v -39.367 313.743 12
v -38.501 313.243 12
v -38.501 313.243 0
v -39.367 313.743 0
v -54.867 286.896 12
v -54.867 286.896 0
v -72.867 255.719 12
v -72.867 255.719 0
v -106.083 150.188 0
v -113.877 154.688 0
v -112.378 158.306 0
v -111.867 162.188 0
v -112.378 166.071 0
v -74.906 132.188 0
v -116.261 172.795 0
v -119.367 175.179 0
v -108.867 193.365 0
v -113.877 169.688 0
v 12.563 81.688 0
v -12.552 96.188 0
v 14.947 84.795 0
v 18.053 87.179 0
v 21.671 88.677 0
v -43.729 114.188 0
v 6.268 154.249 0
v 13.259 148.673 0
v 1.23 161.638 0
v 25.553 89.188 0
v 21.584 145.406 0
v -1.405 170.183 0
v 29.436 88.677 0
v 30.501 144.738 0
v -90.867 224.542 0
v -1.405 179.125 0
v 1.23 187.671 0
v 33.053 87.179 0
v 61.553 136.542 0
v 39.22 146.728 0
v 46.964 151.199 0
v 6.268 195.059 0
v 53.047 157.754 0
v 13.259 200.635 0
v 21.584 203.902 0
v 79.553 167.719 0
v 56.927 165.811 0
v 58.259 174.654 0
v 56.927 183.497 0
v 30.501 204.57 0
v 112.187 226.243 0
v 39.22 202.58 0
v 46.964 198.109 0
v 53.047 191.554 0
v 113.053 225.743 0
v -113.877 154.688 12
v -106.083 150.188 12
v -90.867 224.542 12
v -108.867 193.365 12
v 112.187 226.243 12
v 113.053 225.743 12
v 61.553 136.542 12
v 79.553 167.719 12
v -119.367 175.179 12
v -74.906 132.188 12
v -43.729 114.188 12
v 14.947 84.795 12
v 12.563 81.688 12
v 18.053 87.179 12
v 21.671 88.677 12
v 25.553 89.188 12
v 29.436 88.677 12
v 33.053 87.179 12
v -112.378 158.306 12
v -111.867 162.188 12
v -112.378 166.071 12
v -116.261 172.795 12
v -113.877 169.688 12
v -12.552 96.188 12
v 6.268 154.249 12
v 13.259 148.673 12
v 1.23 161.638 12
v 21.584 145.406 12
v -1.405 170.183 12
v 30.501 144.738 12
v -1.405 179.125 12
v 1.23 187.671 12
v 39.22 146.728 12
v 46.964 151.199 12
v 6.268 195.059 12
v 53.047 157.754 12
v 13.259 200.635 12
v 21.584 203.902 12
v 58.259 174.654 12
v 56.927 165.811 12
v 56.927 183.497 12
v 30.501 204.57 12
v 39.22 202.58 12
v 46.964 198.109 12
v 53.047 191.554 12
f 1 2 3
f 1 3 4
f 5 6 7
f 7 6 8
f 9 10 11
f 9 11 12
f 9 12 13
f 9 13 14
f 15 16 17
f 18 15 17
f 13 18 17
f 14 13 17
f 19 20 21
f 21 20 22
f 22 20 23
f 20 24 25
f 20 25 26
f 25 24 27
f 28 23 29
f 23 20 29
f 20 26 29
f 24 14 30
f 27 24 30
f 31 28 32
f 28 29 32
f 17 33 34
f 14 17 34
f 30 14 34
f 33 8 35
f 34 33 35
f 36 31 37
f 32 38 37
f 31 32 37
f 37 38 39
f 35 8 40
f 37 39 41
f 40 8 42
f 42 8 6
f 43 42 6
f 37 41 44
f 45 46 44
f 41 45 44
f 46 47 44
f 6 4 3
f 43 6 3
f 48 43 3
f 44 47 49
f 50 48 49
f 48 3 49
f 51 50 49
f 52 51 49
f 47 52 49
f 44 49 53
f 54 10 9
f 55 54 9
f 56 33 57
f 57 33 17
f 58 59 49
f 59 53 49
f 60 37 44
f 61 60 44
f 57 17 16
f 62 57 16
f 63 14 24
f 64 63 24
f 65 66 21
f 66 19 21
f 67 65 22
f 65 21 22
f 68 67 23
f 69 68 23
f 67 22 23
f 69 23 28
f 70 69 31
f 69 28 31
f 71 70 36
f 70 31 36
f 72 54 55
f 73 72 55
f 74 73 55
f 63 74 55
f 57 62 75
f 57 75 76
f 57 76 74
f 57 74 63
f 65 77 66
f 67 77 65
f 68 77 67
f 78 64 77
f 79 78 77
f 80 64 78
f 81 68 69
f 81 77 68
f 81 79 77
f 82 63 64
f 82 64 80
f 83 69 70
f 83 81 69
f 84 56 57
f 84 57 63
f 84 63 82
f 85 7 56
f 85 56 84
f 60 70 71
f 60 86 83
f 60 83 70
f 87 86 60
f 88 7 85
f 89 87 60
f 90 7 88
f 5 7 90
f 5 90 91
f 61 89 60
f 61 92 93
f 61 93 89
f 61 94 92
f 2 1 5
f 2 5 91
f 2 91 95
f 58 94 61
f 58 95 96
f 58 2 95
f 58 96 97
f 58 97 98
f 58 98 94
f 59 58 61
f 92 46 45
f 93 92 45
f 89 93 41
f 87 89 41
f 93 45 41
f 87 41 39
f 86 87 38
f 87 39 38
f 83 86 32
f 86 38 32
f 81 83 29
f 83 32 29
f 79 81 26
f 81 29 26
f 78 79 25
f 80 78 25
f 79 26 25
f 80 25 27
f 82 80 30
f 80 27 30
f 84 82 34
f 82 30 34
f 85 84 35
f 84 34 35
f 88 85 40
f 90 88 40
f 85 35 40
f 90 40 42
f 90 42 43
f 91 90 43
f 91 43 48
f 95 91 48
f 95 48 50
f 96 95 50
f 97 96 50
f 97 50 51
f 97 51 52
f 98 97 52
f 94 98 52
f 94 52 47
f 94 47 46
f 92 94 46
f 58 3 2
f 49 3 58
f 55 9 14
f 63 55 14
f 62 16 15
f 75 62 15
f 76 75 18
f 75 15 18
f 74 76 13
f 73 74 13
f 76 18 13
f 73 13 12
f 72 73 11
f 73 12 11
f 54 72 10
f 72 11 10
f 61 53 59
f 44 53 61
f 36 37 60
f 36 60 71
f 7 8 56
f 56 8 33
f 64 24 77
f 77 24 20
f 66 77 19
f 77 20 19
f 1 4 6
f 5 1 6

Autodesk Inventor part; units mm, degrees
ref_plane "YZ Plane" through (0, 0, 0) normal (1, 0, 0) x (0, 1, 0)
ref_plane "XZ Plane" through (0, 0, 0) normal (0, 1, 0) x (-1, 0, 0)
ref_plane "XY Plane" through (0, 0, 0) normal (0, 0, 1) x (1, 0, 0)
ref_plane "Work Plane1" through (0, 0, 0) normal (0, 0, 1) x (1, 0, 0)
sketch "Sketch1" plane through (0, 0, 0) normal (0, 0, 1) x (1, 0, 0)
  circle A0 centre (68.259454, 214.654052) radius 4
  line L0 (64.259454, -185.345948) -> (64.259454, -225.345948)
  arc A1 (72.259454, -185.345948) -> (64.259454, -185.345948) centre (68.259454, -185.345948) ccw
  line L1 (72.259454, -225.345948) -> (72.259454, -185.345948)
  arc A2 (64.259454, -225.345948) -> (72.259454, -225.345948) centre (68.259454, -225.345948) ccw
  line L2 (-101.259454, 230.542101) -> (-90.867149, 224.542101)
  line L3 (-90.867149, 224.542101) -> (-108.867149, 193.365186)
  line L4 (-108.867149, 193.365186) -> (-119.259454, 199.365186)
  line L5 (-137.259454, 168.188271) -> (-119.259454, 199.365186)
  line L6 (-137.259454, 168.188271) -> (-106.082539, 150.188271)
  line L7 (-106.082539, 150.188271) -> (-112.082539, 139.795967)
  line L8 (-80.905625, 121.795967) -> (-112.082539, 139.795967)
  line L9 (-80.905625, 121.795967) -> (-74.905625, 132.188271)
  line L10 (-74.905625, 132.188271) -> (-43.72871, 114.188271)
  line L11 (-43.72871, 114.188271) -> (-49.72871, 103.795967)
  line L12 (-18.551796, 85.795967) -> (-49.72871, 103.795967)
  line L13 (-18.551796, 85.795967) -> (-12.551796, 96.188271)
  line L14 (-12.551796, 96.188271) -> (18.625119, 78.188271)
  line L15 (18.625119, 78.188271) -> (12.625119, 67.795967)
  line L16 (23.259454, 61.656231) -> (12.625119, 67.795967)
  line L17 (23.259454, -7.001047) -> (23.259454, 61.656231)
  line L18 (23.259454, -7.001047) -> (35.259454, -7.001047)
  line L19 (35.259454, -7.001047) -> (35.259454, -43.001047)
  line L20 (35.259454, -43.001047) -> (23.259454, -43.001047)
  line L21 (23.259454, -79.001047) -> (23.259454, -43.001047)
  line L22 (23.259454, -79.001047) -> (35.259454, -79.001047)
  line L23 (35.259454, -79.001047) -> (35.259454, -115.001047)
  line L24 (35.259454, -115.001047) -> (23.259454, -115.001047)
  line L25 (23.259454, -151.001047) -> (23.259454, -115.001047)
  line L26 (23.259454, -151.001047) -> (35.259454, -151.001047)
  line L27 (35.259454, -151.001047) -> (35.259454, -187.001047)
  line L28 (35.259454, -187.001047) -> (23.259454, -187.001047)
  line L29 (23.259454, -223.001047) -> (23.259454, -187.001047)
  line L30 (23.259454, -223.001047) -> (35.259454, -223.001047)
  line L31 (35.259454, -223.001047) -> (35.259454, -259.001047)
  line L32 (35.259454, -259.001047) -> (23.259454, -259.001047)
  line L33 (23.259454, -295.001047) -> (23.259454, -259.001047)
  line L34 (23.259454, -295.001047) -> (35.259454, -295.001047)
  line L35 (35.259454, -295.001047) -> (35.259454, -331.001047)
  line L36 (105.759454, -290.297853) -> (35.259454, -331.001047)
  arc A3 (105.759454, -290.297853) -> (143.259454, -225.345948) centre (68.259454, -225.345948) ccw
  line L37 (143.259454, -185.345948) -> (143.259454, -225.345948)
  arc A4 (143.259454, -185.345948) -> (125.301159, -136.650529) centre (68.259454, -185.345948) ccw
  arc A5 (114.658634, -107.792431) -> (125.301159, -136.650529) centre (159.105469, -107.792431) ccw
  line L38 (114.658634, 129.266291) -> (114.658634, -107.792431)
  arc A6 (128.128133, 169.479488) -> (114.658634, 129.266291) centre (181.421641, 129.266291) ccw
  arc A7 (128.128133, 169.479488) -> (62.965391, 289.466971) centre (68.259454, 214.654052) ccw
  arc A8 (5.90664, 302.61499) -> (62.965391, 289.466971) centre (55.90664, 389.21753) ccw
  line L39 (-43.259454, 331.001047) -> (5.90664, 302.61499)
  line L40 (-65.259454, 292.89593) -> (-43.259454, 331.001047)
  line L41 (-65.259454, 292.89593) -> (-54.867149, 286.89593)
  line L42 (-54.867149, 286.89593) -> (-72.867149, 255.719015)
  line L43 (-72.867149, 255.719015) -> (-83.259454, 261.719015)
  line L44 (-101.259454, 230.542101) -> (-83.259454, 261.719015)
  circle A9 centre (28.259454, 174.654052) radius 30
  line L45 (71.945627, 130.542101) -> (61.553322, 136.542101)
  line L46 (61.553322, 136.542101) -> (79.553322, 167.719015)
  line L47 (79.553322, 167.719015) -> (89.945627, 161.719015)
  line L48 (89.945627, 161.719015) -> (71.945627, 130.542101)
  line L49 (-32.867149, 325.001047) -> (-54.867149, 286.89593)
  line L50 (61.553322, 136.542101) -> (30.062941, 81.999161)
  line L51 (-12.551796, 96.188271) -> (18.625119, 78.188271)
  line L52 (-38.001123, 314.108743) -> (112.687297, 227.108743)
  line L53 (-54.867149, 286.89593) -> (-72.867149, 255.719015)
  line L54 (-74.905625, 132.188271) -> (-43.72871, 114.188271)
  line L55 (-38.001123, 314.108743) -> (112.687297, 227.108743)
  line L56 (119.553322, 237.001047) -> (79.553322, 167.719015)
  line L57 (-38.867149, 314.608743) -> (-126.867149, 162.188271)
  line L58 (-126.867149, 162.188271) -> (25.553322, 74.188271)
  line L59 (25.553322, 74.188271) -> (113.553322, 226.608743)
  line L60 (113.553322, 226.608743) -> (-38.867149, 314.608743)
  circle A10 centre (-126.867149, 162.188271) radius 15
  circle A11 centre (25.553322, 74.188271) radius 15
  circle A12 centre (28.259454, 174.654052) radius 30
  point P0 (0, 0)
  point P1 (37.343087, 270.608743)
  point P2 (37.343087, 270.608743)
  point P3 (70.553322, 152.130558)
  point P4 (-59.317167, 123.188271)
  point P5 (12.562941, 81.688271)
  point P6 (33.053322, 87.178653)
  point P7 (-119.367149, 175.178653)
  point P8 (-113.876768, 154.688271)
  dimension "d0" = 30
  dimension "d1" = 30
  dimension "d2" = 60
extrude "Extrusion1" add sketch "Sketch1" along normal blind 12 contours A0 | L57 L42 L49 L60 L52 L56 L46 L50 A11 L14 L58 L10 L6 A10 L3
move faces "Move1" translate (-0.5, -0.866025, 0) faces at (62.457823, 256.108743, 4)
sketch "Sketch2" plane through (0, 0, 12) normal (0, 0, 1) x (1, 0, 0)
  line L0 (-39.367149, 313.742717) -> (-119.367149, 175.178653)
  arc A0 (-113.876768, 154.688271) -> (-119.367149, 175.178653) centre (-126.867149, 162.188271) ccw
  line L1 (-113.876768, 154.688271) -> (12.562941, 81.688271)
  arc A1 (33.053322, 87.178653) -> (12.562941, 81.688271) centre (25.553322, 74.188271) ccw
  line L2 (33.053322, 87.178653) -> (113.053322, 225.742717)
  line L3 (113.053322, 225.742717) -> (-39.367149, 313.742717)
  circle A2 centre (28.259454, 174.654052) radius 30
  point P0 (0, 0)
equation "\"d1\" = d0"
properties part number "wooden_internal"
